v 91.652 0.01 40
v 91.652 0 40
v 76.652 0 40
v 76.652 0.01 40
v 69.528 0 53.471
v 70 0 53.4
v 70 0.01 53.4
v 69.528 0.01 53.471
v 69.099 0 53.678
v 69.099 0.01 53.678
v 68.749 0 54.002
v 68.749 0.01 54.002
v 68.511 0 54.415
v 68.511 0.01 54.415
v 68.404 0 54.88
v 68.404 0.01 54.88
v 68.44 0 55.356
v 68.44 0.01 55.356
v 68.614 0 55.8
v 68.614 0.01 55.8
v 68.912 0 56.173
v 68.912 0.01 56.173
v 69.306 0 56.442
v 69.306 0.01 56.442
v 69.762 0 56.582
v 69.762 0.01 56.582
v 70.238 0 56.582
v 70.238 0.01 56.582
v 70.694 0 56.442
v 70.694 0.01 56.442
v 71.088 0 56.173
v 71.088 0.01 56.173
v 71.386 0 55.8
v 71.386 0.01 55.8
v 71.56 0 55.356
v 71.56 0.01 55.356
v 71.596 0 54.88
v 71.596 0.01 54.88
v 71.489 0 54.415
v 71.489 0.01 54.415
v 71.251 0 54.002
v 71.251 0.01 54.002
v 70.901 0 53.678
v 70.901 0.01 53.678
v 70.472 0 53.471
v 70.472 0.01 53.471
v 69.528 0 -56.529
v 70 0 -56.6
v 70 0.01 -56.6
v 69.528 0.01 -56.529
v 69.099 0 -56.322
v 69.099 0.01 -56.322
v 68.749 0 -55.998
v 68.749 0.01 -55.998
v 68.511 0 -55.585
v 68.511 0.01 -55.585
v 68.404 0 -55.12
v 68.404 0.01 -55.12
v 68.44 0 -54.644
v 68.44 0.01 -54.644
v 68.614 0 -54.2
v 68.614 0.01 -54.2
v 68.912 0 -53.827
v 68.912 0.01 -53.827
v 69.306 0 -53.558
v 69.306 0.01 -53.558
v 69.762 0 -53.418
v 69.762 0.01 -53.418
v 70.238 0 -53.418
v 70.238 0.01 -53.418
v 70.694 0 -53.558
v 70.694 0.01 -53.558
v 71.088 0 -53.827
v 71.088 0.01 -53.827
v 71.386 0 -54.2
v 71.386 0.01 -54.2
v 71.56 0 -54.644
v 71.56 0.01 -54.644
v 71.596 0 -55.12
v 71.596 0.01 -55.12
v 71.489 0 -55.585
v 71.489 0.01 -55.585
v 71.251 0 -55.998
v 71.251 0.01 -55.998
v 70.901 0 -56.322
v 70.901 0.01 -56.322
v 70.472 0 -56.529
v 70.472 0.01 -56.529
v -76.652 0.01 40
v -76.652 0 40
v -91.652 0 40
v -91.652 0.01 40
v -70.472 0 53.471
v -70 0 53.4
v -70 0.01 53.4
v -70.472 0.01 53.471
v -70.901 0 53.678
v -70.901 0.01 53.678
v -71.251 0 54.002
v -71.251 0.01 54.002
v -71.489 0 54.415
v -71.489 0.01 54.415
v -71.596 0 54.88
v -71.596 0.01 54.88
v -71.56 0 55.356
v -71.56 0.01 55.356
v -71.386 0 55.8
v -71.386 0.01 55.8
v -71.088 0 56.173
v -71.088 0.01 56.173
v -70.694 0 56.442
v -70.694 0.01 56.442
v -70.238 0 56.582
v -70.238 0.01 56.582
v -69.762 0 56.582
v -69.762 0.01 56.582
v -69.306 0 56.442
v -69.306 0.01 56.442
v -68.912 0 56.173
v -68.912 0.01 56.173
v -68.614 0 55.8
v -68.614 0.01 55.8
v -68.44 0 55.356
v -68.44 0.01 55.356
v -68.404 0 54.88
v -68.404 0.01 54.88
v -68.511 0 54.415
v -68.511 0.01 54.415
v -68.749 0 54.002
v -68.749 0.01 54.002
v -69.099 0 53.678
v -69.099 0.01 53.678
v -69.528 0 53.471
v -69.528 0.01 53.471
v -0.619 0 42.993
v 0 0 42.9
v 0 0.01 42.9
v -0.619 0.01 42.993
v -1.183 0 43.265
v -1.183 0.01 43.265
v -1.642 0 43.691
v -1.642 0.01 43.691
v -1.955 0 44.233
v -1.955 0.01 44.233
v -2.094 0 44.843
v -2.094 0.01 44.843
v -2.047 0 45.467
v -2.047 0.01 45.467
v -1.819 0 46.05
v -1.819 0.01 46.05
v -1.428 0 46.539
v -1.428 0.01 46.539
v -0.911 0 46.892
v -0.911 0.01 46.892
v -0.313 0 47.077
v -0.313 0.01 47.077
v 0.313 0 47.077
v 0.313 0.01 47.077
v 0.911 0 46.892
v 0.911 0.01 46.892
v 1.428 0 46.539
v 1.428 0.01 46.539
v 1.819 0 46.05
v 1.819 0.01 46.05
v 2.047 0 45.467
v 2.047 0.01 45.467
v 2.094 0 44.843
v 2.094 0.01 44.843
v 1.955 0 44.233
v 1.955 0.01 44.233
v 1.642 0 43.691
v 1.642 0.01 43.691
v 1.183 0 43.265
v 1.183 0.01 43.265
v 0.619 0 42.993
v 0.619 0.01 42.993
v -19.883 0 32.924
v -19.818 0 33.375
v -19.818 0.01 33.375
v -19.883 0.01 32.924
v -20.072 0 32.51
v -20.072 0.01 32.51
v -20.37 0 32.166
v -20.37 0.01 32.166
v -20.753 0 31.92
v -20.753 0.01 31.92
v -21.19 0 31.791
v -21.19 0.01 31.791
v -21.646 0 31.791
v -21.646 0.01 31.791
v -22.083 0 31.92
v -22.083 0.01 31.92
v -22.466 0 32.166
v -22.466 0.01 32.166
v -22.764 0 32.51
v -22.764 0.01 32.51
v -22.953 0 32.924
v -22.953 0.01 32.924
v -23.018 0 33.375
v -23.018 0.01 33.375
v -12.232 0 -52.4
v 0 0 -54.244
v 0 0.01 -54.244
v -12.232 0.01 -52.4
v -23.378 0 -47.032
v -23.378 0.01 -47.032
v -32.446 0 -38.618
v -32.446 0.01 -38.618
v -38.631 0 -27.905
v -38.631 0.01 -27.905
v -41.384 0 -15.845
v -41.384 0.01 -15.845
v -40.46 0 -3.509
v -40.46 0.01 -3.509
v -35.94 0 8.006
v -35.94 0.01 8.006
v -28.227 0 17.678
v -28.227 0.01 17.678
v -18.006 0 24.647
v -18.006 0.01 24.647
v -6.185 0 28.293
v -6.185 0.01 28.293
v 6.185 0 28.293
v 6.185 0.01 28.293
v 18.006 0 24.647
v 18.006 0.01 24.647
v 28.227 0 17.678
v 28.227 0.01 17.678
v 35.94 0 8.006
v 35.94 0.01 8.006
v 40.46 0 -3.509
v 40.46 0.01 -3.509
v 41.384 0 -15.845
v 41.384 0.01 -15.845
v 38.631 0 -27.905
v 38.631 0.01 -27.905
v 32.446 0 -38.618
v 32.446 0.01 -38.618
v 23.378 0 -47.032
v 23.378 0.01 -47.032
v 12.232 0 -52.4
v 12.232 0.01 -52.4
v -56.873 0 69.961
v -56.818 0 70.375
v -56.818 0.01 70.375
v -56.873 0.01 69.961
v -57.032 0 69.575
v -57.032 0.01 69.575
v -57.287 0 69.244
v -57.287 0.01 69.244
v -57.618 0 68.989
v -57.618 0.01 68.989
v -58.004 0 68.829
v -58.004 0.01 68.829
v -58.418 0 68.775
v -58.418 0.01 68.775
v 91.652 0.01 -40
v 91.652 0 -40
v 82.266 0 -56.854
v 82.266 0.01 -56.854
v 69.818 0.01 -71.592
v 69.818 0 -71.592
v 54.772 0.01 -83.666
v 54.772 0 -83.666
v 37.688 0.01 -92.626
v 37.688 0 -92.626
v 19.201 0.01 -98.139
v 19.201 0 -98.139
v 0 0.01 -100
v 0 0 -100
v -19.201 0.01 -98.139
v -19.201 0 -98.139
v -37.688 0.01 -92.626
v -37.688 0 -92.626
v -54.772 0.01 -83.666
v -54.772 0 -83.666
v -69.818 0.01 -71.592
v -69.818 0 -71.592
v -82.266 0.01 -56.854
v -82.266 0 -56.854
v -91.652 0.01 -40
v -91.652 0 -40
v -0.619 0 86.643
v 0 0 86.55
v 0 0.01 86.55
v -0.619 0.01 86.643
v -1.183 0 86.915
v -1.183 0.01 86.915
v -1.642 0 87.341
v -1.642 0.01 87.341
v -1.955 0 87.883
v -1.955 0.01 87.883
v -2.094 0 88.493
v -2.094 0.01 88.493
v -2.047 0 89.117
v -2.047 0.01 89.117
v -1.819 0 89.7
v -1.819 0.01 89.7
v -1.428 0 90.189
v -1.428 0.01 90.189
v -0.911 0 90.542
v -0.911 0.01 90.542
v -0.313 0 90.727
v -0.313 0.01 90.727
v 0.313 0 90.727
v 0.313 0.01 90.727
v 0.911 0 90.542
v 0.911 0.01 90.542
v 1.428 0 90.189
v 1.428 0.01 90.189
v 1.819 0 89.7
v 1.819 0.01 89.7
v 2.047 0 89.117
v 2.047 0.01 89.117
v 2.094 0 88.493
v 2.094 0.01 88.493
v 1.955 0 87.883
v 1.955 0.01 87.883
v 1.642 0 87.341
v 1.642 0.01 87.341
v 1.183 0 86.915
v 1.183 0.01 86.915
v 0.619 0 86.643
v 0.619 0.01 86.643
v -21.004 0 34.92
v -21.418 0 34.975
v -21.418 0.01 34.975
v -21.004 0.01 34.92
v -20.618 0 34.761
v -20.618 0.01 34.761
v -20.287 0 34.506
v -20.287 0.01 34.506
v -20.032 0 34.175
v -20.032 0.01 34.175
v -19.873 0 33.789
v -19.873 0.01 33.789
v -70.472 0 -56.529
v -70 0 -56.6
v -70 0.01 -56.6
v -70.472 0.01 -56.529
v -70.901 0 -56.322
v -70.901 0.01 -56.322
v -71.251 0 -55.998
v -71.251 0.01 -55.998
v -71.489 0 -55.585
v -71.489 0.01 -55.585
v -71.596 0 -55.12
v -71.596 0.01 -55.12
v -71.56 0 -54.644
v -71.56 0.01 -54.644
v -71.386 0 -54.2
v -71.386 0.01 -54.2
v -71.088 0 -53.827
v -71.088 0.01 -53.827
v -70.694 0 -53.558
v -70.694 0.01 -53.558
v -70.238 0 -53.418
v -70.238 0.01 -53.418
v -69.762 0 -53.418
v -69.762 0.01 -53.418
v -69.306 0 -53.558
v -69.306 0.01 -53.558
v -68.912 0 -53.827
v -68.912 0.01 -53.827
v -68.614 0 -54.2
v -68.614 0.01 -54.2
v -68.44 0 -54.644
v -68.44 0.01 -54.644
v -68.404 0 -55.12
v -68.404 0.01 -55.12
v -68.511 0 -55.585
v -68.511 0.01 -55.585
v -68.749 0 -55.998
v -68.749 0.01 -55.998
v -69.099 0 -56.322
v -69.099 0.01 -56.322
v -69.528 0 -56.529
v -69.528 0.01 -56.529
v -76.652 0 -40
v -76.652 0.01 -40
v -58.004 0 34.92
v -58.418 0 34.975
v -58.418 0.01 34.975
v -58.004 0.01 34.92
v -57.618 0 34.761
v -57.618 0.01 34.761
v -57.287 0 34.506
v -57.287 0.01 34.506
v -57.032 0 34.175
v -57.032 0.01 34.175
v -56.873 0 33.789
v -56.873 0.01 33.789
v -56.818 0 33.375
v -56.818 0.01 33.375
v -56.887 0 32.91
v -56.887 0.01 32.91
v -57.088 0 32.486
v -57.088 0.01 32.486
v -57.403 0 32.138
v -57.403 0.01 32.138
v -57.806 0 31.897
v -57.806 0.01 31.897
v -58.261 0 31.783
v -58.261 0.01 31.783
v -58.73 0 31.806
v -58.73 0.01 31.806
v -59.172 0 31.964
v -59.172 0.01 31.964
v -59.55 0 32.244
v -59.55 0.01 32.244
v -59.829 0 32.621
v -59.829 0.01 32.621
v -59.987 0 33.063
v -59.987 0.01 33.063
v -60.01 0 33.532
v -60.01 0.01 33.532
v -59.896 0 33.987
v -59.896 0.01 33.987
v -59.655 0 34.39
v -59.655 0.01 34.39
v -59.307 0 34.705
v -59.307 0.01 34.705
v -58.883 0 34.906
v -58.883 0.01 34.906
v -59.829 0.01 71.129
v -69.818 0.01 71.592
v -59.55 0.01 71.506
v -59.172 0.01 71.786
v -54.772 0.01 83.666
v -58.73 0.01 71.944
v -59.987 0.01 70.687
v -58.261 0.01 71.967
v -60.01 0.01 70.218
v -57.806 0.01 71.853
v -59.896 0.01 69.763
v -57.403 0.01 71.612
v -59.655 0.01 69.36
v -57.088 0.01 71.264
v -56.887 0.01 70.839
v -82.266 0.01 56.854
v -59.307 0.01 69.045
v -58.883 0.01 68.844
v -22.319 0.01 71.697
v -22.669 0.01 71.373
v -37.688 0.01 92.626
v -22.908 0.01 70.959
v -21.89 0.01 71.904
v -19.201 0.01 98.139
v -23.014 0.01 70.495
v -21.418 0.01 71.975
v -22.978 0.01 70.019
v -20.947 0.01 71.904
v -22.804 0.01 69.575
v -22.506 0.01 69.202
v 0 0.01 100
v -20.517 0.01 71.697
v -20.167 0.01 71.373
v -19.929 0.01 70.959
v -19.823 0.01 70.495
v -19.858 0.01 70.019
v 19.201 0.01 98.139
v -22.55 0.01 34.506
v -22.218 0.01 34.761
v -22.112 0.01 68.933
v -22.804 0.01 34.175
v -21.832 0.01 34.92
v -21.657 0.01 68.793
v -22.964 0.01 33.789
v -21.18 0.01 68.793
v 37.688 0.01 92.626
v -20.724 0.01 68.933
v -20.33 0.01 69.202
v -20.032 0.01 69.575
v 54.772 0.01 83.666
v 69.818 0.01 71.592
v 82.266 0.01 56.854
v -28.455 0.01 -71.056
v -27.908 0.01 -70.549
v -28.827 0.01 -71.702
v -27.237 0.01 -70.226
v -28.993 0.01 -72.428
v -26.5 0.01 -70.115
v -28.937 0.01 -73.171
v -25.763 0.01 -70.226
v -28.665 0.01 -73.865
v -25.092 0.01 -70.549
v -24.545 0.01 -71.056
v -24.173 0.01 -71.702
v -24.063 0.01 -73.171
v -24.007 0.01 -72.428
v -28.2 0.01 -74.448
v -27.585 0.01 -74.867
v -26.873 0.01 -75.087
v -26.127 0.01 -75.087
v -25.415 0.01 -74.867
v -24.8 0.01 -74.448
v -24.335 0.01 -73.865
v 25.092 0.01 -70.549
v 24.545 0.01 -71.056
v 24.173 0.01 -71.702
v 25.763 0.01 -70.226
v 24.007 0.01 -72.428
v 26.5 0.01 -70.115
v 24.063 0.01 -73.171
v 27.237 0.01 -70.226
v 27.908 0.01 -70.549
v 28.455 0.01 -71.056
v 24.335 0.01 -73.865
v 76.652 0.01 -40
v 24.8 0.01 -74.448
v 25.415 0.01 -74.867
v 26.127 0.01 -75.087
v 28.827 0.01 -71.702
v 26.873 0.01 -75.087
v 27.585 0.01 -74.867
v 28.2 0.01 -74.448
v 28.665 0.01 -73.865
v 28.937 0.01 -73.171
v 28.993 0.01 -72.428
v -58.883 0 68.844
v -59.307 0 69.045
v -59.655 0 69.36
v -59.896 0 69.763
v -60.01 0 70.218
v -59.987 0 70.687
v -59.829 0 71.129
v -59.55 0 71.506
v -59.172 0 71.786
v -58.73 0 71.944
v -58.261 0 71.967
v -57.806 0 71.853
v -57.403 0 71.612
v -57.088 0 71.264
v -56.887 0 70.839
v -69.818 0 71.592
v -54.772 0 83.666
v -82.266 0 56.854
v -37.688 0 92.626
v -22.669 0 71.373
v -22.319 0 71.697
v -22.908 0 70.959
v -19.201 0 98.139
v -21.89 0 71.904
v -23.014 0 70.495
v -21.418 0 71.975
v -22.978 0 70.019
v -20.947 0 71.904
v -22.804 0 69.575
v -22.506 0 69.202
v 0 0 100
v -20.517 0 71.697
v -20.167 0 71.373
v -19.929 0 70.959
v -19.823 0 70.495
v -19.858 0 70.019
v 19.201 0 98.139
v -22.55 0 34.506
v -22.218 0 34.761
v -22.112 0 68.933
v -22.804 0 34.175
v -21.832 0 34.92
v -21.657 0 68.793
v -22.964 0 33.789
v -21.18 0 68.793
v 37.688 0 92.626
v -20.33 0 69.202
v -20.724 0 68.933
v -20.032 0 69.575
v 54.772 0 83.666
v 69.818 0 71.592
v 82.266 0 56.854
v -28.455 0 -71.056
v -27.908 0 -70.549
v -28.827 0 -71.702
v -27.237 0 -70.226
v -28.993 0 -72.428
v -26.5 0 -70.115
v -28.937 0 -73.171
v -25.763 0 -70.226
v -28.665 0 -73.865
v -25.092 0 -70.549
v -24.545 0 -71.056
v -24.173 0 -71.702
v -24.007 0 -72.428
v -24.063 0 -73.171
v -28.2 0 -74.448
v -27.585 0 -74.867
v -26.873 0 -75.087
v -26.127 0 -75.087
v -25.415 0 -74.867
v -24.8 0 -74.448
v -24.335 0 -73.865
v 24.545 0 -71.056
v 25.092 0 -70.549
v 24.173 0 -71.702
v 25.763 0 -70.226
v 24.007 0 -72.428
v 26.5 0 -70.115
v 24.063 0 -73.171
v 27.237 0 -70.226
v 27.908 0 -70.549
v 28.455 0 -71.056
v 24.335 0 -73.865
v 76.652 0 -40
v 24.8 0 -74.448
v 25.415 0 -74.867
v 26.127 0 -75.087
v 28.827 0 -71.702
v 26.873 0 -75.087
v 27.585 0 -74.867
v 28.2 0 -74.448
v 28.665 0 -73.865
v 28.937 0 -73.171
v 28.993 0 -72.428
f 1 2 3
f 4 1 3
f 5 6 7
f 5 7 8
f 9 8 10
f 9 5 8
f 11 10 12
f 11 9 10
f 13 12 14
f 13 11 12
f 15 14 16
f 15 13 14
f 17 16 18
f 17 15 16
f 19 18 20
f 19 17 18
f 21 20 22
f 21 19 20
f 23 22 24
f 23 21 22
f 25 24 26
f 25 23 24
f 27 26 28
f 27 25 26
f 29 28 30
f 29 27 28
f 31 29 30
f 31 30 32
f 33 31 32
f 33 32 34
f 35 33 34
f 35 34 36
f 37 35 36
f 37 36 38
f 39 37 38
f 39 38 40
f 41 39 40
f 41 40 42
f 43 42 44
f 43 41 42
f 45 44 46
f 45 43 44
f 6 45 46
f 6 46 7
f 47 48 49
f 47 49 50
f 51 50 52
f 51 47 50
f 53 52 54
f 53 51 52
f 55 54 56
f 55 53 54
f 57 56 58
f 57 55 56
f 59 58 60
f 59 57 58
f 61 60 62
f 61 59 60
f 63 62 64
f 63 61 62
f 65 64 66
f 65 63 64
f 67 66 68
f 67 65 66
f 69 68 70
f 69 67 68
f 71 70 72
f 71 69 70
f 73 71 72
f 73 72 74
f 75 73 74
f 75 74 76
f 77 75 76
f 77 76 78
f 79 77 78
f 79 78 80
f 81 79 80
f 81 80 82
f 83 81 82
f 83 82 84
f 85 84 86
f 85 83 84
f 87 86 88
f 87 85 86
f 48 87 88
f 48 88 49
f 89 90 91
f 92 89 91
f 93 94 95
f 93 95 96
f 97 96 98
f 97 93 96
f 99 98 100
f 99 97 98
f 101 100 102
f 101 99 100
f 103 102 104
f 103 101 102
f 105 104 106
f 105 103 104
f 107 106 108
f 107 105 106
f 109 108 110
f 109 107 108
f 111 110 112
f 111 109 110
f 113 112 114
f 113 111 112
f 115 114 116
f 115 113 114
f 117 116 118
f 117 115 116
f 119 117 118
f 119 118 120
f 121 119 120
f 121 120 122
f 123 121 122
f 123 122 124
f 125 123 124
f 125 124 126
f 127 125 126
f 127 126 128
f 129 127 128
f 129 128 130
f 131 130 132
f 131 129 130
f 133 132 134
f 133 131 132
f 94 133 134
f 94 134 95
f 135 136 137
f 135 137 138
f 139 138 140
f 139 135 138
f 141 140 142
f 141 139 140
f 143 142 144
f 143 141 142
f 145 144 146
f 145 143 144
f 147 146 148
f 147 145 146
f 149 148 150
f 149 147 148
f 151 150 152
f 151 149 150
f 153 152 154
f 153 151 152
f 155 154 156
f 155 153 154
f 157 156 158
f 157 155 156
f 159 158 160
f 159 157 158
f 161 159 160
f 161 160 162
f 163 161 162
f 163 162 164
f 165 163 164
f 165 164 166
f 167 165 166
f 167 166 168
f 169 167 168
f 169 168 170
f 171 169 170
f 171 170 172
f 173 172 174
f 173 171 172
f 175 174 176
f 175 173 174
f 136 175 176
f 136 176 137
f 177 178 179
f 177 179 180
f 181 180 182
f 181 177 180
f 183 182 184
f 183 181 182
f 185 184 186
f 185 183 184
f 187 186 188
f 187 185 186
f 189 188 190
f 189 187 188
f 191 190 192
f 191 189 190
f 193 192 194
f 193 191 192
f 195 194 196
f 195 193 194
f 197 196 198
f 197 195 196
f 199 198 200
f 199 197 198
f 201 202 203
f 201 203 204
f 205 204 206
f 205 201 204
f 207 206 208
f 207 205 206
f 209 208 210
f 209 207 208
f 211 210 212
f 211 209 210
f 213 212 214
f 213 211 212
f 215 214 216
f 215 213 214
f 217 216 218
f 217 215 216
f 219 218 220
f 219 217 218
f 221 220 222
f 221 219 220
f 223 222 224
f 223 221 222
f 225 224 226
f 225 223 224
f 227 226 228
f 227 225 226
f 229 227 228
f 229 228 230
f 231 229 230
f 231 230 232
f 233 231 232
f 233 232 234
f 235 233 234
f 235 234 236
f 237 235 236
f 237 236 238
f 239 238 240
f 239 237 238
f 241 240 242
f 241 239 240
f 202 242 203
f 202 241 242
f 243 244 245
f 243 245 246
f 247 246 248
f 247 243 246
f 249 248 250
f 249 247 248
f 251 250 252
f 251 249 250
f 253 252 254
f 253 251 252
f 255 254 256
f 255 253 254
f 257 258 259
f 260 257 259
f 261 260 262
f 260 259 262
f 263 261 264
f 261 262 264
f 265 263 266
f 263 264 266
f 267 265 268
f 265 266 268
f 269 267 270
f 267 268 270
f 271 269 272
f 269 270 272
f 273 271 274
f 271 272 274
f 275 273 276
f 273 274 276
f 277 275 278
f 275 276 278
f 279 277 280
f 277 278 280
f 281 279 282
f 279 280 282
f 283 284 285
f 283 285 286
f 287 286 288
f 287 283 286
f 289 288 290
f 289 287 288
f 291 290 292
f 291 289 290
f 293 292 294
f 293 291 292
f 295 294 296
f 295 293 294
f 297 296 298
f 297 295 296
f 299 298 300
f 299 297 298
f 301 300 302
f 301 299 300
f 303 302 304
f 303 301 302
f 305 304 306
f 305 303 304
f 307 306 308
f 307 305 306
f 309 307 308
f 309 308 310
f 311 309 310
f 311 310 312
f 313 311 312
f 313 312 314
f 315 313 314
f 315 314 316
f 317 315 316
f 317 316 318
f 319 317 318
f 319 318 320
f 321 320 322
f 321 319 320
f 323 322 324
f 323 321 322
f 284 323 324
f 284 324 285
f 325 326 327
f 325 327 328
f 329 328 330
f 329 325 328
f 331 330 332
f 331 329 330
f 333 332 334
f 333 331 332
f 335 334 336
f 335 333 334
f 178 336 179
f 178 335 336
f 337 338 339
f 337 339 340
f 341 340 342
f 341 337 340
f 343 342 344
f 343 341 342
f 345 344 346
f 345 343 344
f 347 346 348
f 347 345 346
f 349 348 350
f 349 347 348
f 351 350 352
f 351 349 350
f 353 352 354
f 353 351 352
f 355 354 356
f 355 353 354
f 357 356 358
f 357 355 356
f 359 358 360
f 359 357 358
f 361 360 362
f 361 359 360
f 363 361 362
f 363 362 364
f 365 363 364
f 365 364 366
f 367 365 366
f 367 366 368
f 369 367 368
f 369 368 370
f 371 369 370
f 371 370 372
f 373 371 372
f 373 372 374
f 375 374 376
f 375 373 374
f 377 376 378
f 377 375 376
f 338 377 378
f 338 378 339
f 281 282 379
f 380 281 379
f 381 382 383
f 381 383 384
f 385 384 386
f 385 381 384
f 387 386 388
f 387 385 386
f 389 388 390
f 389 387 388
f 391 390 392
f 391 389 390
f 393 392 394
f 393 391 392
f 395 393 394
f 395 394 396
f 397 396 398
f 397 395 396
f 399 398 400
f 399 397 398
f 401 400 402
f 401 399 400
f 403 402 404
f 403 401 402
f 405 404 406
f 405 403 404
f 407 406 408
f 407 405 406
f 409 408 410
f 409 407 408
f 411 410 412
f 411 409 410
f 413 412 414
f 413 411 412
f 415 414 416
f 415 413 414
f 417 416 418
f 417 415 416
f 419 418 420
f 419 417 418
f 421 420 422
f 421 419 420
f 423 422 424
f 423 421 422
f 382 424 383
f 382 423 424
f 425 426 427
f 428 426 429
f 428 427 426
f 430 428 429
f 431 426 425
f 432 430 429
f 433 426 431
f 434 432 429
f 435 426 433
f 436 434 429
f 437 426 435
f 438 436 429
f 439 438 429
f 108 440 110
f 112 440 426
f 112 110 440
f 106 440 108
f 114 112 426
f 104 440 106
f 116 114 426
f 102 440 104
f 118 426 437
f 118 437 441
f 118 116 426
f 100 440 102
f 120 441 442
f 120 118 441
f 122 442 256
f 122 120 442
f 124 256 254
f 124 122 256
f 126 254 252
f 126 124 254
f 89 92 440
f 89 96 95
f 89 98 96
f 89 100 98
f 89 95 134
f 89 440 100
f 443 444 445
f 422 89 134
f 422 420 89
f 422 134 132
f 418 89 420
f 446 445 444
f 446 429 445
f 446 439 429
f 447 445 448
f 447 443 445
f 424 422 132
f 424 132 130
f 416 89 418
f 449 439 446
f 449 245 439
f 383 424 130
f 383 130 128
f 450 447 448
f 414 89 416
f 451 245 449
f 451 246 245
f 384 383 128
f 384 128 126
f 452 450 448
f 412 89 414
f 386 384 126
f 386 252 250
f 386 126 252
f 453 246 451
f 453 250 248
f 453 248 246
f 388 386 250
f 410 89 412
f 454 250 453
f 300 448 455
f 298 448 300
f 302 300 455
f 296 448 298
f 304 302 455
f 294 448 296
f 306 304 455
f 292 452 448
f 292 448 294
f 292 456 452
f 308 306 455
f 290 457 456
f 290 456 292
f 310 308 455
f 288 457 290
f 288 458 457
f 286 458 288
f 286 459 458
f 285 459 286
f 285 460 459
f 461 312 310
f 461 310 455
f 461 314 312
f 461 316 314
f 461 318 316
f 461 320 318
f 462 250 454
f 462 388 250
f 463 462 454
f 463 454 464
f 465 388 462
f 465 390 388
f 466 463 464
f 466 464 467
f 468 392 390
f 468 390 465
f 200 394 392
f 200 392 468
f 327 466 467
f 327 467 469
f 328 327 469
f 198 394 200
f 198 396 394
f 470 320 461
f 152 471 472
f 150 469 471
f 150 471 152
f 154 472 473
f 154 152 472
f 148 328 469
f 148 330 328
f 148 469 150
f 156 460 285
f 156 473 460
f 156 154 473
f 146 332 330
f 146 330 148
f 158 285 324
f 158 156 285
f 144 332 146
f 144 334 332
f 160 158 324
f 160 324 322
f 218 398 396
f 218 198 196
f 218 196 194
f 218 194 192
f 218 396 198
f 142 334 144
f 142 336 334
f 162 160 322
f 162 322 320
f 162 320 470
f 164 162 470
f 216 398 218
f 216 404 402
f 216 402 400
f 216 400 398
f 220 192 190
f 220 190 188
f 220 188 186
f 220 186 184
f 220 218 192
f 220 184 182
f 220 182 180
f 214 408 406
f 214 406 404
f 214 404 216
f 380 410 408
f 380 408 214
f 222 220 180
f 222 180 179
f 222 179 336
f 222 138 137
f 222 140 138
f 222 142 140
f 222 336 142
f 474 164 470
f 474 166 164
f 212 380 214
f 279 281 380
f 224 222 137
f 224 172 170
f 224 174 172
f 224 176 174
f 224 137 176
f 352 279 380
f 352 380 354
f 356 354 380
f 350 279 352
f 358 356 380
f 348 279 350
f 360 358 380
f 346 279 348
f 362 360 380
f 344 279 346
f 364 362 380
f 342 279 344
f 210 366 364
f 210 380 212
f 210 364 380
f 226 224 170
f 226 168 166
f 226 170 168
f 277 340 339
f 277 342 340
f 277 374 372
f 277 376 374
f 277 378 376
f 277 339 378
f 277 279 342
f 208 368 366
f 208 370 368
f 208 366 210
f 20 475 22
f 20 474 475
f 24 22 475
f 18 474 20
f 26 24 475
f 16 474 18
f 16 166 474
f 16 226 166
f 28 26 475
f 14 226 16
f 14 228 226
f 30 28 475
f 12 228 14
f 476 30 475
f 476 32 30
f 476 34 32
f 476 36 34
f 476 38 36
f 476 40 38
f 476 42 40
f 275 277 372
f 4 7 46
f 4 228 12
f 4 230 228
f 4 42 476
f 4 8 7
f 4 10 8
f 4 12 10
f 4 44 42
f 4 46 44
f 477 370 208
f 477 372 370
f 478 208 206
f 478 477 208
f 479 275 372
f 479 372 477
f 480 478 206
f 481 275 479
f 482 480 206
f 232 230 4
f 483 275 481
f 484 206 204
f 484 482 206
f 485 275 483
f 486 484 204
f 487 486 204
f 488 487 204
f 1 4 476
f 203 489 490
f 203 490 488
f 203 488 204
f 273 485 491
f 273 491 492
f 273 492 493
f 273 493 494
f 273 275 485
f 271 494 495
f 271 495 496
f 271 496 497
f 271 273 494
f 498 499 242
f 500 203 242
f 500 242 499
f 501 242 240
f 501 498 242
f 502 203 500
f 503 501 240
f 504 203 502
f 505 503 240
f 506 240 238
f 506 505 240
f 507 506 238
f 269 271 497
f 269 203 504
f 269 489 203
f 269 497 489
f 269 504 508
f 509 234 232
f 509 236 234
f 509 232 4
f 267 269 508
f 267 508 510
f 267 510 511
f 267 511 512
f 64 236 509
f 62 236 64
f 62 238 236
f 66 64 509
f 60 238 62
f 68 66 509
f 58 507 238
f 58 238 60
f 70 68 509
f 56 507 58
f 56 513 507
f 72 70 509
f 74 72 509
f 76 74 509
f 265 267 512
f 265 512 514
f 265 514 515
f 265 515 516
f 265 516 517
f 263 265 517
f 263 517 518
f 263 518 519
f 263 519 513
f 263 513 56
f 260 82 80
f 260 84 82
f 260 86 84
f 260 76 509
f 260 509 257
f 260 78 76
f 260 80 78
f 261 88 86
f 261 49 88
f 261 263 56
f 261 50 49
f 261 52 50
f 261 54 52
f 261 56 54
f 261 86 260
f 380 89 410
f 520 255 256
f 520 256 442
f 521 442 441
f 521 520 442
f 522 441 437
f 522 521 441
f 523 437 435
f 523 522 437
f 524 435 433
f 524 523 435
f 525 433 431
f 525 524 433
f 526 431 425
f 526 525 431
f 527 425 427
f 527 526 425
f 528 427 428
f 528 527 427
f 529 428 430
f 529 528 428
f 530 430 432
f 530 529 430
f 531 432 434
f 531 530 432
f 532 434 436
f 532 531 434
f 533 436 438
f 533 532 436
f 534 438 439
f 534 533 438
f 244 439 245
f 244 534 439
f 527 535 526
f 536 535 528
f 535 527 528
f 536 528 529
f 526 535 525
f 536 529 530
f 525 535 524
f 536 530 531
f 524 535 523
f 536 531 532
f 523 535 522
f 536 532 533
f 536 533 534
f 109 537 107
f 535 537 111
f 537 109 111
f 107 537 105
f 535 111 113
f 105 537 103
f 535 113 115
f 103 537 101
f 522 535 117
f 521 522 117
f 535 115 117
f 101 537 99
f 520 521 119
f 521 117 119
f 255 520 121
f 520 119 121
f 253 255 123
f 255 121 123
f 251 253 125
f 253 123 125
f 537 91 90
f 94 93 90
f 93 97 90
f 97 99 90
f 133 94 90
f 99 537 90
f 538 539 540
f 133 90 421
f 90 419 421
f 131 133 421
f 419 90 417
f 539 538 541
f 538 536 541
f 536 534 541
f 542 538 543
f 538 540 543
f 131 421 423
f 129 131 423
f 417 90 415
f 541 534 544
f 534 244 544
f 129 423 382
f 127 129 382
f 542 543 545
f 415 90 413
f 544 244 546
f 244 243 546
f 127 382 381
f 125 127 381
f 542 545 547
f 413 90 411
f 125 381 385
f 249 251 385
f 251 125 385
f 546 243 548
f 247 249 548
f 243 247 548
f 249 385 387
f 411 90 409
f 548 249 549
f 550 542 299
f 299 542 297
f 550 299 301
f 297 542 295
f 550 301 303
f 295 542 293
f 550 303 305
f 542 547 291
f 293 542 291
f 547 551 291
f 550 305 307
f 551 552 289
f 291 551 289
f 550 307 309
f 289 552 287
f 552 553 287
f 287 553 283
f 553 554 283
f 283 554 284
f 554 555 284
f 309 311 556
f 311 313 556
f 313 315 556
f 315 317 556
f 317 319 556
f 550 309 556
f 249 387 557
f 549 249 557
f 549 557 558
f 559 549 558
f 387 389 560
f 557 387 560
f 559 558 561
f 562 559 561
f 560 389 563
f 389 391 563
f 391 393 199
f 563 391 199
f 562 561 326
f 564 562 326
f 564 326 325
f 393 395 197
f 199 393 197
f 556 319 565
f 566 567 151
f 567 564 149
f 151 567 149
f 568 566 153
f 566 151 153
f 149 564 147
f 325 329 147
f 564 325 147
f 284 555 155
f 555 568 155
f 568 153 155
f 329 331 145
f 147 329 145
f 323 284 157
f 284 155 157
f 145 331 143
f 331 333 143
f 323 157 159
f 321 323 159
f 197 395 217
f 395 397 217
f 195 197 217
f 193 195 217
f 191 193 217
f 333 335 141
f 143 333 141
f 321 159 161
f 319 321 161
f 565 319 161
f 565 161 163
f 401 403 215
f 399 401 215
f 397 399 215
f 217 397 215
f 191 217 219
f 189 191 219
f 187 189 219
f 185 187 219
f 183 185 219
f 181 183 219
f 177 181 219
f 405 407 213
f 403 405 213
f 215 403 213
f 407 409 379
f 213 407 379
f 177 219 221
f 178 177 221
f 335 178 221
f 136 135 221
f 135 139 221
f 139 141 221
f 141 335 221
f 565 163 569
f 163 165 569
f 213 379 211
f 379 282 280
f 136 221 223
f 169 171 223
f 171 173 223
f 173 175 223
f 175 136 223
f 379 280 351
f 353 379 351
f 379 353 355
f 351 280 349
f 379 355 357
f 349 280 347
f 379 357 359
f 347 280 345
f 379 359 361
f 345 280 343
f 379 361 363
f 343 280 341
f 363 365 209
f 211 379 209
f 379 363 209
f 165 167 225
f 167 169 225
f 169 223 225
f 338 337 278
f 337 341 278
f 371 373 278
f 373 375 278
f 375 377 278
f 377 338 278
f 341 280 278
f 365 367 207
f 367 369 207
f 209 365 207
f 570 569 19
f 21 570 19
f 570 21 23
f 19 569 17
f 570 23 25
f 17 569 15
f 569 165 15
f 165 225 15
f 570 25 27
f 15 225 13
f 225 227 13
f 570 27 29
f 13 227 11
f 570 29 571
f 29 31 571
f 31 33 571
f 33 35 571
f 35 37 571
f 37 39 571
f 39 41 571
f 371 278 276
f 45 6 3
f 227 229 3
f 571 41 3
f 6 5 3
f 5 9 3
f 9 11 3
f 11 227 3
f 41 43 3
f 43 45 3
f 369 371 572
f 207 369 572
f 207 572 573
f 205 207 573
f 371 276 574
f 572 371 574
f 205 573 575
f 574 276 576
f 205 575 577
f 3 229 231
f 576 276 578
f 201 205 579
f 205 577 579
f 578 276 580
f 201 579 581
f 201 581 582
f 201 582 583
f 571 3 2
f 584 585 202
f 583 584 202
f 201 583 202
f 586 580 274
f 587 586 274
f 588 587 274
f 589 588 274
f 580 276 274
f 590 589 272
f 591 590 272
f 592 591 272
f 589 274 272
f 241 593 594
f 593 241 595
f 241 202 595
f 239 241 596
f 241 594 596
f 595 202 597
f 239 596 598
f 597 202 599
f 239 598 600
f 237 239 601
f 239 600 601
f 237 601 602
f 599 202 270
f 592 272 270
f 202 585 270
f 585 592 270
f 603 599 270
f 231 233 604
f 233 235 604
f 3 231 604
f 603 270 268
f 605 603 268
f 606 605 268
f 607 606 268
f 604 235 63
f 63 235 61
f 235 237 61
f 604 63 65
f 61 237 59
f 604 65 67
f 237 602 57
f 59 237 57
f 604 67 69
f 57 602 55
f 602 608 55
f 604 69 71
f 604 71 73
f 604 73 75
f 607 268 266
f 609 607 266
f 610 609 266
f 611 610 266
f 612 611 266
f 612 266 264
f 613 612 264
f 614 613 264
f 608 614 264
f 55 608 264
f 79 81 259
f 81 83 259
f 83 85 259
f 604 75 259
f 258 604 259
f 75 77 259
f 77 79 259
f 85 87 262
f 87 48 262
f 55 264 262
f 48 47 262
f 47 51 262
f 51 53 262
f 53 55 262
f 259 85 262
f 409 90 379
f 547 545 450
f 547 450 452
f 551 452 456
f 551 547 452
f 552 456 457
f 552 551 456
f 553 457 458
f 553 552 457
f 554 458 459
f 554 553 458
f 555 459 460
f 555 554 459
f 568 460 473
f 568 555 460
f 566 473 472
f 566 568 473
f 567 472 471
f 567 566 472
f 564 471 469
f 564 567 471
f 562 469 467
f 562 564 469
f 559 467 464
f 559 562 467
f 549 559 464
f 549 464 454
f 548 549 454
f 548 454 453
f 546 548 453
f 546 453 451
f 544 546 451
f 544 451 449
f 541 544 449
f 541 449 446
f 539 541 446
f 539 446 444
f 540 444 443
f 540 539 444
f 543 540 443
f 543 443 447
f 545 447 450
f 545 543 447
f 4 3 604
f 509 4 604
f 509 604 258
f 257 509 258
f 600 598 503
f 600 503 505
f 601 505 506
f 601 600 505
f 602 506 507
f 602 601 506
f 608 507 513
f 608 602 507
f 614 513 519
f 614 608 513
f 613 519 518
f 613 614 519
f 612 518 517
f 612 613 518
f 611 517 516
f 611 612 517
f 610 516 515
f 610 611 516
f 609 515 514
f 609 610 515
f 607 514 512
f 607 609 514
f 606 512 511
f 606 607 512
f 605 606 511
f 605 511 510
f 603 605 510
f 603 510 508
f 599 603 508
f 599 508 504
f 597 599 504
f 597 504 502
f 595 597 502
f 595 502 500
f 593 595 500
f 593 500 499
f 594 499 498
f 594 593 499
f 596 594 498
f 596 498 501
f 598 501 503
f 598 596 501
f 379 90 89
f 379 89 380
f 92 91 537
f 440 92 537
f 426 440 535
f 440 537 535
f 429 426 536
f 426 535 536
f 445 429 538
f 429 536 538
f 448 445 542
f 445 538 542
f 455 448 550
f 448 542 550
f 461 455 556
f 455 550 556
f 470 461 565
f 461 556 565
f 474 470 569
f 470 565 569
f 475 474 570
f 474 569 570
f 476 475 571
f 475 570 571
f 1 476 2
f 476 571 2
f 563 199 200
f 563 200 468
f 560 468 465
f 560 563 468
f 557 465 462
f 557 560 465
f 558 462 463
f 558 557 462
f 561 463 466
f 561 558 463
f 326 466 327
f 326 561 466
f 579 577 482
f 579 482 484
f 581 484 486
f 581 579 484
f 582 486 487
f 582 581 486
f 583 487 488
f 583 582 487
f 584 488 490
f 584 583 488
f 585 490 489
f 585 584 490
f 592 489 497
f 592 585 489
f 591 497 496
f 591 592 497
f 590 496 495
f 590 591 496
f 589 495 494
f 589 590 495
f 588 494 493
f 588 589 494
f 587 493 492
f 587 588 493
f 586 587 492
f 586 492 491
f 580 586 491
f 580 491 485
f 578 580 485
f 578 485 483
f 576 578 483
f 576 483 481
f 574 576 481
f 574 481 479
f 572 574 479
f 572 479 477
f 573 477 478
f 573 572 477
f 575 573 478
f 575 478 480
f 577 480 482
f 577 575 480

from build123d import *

# Parameters (mm, degrees)
SKETCH_2_R               = 1.6
SKETCH_2_R_2             = 2.1
SKETCH_2_R_3             = 41.5
EXTRUDE_1_DEPTH          = 0.01
CUT_EXTRUDE_8_DEPTH      = 136.646600031
CUT_EXTRUDE_8_DEPTH_BACK = 136.646600031
SKETCH_6_R               = 1.6
CUT_EXTRUDE_9_DEPTH      = 136.646600031
CUT_EXTRUDE_9_DEPTH_BACK = 136.646600031
SKETCH_7_R               = 2.5


with BuildPart() as part:
    # 草圖2 → 填料-伸長1 (new body)
    with BuildSketch(Plane(origin=(0, 0, 0), x_dir=(1, 0, 0), z_dir=(0, 1, 0))):
        with BuildLine():
            Line((76.651513899, -40), (76.651513899, 40))
            Line((76.651513899, 40), (91.651513899, 40))
            ThreePointArc((91.651513899, 40), (0, 100), (-91.651513899, 40))
            Line((-91.651513899, 40), (-76.651513899, 40))
            Line((-76.651513899, 40), (-76.651513899, -40))
            Line((-76.651513899, -40), (-91.651513899, -40))
            ThreePointArc((-91.651513899, -40), (0, -100), (91.651513899, -40))
            Line((91.651513899, -40), (76.651513899, -40))
        make_face()
        with Locations((-70, -55)):
            Circle(SKETCH_2_R, mode=Mode.SUBTRACT)
        with Locations((0, -88.65)):
            Circle(SKETCH_2_R_2, mode=Mode.SUBTRACT)
        with Locations((70, -55)):
            Circle(SKETCH_2_R, mode=Mode.SUBTRACT)
        with Locations((0, -45)):
            Circle(SKETCH_2_R_2, mode=Mode.SUBTRACT)
        with Locations((-70, 55)):
            Circle(SKETCH_2_R, mode=Mode.SUBTRACT)
        with Locations((0, 12.743545883)):
            Circle(SKETCH_2_R_3, mode=Mode.SUBTRACT)
        with Locations((70, 55)):
            Circle(SKETCH_2_R, mode=Mode.SUBTRACT)
    extrude(amount=EXTRUDE_1_DEPTH)

    # 草圖6 → 除料-伸長8 (cut, two sides: drawn at the far end of the back side and taken through both)
    with BuildSketch(Plane(origin=(0, 0.01, 0), x_dir=(1, 0, 0), z_dir=(0, 1, 0)).offset(-CUT_EXTRUDE_8_DEPTH_BACK)):
        with Locations((-58.41813564, -33.374946877)):
            Circle(SKETCH_6_R)
        with Locations((-21.41813564, -33.374946877)):
            Circle(SKETCH_6_R)
        with Locations((-58.41813564, -70.374946877)):
            Circle(SKETCH_6_R)
        with Locations((-21.41813564, -70.374946877)):
            Circle(SKETCH_6_R)
    extrude(amount=CUT_EXTRUDE_8_DEPTH + CUT_EXTRUDE_8_DEPTH_BACK, mode=Mode.SUBTRACT)

    # 草圖7 → 除料-伸長9 (cut, two sides: drawn at the far end of the back side and taken through both)
    with BuildSketch(Plane(origin=(0, 0.01, 0), x_dir=(1, 0, 0), z_dir=(0, 1, 0)).offset(-CUT_EXTRUDE_9_DEPTH_BACK)):
        with Locations((-26.5, 72.61491789)):
            Circle(SKETCH_7_R)
        with Locations((26.5, 72.61491789)):
            Circle(SKETCH_7_R)
    extrude(amount=CUT_EXTRUDE_9_DEPTH + CUT_EXTRUDE_9_DEPTH_BACK, mode=Mode.SUBTRACT)


solid = part.part
